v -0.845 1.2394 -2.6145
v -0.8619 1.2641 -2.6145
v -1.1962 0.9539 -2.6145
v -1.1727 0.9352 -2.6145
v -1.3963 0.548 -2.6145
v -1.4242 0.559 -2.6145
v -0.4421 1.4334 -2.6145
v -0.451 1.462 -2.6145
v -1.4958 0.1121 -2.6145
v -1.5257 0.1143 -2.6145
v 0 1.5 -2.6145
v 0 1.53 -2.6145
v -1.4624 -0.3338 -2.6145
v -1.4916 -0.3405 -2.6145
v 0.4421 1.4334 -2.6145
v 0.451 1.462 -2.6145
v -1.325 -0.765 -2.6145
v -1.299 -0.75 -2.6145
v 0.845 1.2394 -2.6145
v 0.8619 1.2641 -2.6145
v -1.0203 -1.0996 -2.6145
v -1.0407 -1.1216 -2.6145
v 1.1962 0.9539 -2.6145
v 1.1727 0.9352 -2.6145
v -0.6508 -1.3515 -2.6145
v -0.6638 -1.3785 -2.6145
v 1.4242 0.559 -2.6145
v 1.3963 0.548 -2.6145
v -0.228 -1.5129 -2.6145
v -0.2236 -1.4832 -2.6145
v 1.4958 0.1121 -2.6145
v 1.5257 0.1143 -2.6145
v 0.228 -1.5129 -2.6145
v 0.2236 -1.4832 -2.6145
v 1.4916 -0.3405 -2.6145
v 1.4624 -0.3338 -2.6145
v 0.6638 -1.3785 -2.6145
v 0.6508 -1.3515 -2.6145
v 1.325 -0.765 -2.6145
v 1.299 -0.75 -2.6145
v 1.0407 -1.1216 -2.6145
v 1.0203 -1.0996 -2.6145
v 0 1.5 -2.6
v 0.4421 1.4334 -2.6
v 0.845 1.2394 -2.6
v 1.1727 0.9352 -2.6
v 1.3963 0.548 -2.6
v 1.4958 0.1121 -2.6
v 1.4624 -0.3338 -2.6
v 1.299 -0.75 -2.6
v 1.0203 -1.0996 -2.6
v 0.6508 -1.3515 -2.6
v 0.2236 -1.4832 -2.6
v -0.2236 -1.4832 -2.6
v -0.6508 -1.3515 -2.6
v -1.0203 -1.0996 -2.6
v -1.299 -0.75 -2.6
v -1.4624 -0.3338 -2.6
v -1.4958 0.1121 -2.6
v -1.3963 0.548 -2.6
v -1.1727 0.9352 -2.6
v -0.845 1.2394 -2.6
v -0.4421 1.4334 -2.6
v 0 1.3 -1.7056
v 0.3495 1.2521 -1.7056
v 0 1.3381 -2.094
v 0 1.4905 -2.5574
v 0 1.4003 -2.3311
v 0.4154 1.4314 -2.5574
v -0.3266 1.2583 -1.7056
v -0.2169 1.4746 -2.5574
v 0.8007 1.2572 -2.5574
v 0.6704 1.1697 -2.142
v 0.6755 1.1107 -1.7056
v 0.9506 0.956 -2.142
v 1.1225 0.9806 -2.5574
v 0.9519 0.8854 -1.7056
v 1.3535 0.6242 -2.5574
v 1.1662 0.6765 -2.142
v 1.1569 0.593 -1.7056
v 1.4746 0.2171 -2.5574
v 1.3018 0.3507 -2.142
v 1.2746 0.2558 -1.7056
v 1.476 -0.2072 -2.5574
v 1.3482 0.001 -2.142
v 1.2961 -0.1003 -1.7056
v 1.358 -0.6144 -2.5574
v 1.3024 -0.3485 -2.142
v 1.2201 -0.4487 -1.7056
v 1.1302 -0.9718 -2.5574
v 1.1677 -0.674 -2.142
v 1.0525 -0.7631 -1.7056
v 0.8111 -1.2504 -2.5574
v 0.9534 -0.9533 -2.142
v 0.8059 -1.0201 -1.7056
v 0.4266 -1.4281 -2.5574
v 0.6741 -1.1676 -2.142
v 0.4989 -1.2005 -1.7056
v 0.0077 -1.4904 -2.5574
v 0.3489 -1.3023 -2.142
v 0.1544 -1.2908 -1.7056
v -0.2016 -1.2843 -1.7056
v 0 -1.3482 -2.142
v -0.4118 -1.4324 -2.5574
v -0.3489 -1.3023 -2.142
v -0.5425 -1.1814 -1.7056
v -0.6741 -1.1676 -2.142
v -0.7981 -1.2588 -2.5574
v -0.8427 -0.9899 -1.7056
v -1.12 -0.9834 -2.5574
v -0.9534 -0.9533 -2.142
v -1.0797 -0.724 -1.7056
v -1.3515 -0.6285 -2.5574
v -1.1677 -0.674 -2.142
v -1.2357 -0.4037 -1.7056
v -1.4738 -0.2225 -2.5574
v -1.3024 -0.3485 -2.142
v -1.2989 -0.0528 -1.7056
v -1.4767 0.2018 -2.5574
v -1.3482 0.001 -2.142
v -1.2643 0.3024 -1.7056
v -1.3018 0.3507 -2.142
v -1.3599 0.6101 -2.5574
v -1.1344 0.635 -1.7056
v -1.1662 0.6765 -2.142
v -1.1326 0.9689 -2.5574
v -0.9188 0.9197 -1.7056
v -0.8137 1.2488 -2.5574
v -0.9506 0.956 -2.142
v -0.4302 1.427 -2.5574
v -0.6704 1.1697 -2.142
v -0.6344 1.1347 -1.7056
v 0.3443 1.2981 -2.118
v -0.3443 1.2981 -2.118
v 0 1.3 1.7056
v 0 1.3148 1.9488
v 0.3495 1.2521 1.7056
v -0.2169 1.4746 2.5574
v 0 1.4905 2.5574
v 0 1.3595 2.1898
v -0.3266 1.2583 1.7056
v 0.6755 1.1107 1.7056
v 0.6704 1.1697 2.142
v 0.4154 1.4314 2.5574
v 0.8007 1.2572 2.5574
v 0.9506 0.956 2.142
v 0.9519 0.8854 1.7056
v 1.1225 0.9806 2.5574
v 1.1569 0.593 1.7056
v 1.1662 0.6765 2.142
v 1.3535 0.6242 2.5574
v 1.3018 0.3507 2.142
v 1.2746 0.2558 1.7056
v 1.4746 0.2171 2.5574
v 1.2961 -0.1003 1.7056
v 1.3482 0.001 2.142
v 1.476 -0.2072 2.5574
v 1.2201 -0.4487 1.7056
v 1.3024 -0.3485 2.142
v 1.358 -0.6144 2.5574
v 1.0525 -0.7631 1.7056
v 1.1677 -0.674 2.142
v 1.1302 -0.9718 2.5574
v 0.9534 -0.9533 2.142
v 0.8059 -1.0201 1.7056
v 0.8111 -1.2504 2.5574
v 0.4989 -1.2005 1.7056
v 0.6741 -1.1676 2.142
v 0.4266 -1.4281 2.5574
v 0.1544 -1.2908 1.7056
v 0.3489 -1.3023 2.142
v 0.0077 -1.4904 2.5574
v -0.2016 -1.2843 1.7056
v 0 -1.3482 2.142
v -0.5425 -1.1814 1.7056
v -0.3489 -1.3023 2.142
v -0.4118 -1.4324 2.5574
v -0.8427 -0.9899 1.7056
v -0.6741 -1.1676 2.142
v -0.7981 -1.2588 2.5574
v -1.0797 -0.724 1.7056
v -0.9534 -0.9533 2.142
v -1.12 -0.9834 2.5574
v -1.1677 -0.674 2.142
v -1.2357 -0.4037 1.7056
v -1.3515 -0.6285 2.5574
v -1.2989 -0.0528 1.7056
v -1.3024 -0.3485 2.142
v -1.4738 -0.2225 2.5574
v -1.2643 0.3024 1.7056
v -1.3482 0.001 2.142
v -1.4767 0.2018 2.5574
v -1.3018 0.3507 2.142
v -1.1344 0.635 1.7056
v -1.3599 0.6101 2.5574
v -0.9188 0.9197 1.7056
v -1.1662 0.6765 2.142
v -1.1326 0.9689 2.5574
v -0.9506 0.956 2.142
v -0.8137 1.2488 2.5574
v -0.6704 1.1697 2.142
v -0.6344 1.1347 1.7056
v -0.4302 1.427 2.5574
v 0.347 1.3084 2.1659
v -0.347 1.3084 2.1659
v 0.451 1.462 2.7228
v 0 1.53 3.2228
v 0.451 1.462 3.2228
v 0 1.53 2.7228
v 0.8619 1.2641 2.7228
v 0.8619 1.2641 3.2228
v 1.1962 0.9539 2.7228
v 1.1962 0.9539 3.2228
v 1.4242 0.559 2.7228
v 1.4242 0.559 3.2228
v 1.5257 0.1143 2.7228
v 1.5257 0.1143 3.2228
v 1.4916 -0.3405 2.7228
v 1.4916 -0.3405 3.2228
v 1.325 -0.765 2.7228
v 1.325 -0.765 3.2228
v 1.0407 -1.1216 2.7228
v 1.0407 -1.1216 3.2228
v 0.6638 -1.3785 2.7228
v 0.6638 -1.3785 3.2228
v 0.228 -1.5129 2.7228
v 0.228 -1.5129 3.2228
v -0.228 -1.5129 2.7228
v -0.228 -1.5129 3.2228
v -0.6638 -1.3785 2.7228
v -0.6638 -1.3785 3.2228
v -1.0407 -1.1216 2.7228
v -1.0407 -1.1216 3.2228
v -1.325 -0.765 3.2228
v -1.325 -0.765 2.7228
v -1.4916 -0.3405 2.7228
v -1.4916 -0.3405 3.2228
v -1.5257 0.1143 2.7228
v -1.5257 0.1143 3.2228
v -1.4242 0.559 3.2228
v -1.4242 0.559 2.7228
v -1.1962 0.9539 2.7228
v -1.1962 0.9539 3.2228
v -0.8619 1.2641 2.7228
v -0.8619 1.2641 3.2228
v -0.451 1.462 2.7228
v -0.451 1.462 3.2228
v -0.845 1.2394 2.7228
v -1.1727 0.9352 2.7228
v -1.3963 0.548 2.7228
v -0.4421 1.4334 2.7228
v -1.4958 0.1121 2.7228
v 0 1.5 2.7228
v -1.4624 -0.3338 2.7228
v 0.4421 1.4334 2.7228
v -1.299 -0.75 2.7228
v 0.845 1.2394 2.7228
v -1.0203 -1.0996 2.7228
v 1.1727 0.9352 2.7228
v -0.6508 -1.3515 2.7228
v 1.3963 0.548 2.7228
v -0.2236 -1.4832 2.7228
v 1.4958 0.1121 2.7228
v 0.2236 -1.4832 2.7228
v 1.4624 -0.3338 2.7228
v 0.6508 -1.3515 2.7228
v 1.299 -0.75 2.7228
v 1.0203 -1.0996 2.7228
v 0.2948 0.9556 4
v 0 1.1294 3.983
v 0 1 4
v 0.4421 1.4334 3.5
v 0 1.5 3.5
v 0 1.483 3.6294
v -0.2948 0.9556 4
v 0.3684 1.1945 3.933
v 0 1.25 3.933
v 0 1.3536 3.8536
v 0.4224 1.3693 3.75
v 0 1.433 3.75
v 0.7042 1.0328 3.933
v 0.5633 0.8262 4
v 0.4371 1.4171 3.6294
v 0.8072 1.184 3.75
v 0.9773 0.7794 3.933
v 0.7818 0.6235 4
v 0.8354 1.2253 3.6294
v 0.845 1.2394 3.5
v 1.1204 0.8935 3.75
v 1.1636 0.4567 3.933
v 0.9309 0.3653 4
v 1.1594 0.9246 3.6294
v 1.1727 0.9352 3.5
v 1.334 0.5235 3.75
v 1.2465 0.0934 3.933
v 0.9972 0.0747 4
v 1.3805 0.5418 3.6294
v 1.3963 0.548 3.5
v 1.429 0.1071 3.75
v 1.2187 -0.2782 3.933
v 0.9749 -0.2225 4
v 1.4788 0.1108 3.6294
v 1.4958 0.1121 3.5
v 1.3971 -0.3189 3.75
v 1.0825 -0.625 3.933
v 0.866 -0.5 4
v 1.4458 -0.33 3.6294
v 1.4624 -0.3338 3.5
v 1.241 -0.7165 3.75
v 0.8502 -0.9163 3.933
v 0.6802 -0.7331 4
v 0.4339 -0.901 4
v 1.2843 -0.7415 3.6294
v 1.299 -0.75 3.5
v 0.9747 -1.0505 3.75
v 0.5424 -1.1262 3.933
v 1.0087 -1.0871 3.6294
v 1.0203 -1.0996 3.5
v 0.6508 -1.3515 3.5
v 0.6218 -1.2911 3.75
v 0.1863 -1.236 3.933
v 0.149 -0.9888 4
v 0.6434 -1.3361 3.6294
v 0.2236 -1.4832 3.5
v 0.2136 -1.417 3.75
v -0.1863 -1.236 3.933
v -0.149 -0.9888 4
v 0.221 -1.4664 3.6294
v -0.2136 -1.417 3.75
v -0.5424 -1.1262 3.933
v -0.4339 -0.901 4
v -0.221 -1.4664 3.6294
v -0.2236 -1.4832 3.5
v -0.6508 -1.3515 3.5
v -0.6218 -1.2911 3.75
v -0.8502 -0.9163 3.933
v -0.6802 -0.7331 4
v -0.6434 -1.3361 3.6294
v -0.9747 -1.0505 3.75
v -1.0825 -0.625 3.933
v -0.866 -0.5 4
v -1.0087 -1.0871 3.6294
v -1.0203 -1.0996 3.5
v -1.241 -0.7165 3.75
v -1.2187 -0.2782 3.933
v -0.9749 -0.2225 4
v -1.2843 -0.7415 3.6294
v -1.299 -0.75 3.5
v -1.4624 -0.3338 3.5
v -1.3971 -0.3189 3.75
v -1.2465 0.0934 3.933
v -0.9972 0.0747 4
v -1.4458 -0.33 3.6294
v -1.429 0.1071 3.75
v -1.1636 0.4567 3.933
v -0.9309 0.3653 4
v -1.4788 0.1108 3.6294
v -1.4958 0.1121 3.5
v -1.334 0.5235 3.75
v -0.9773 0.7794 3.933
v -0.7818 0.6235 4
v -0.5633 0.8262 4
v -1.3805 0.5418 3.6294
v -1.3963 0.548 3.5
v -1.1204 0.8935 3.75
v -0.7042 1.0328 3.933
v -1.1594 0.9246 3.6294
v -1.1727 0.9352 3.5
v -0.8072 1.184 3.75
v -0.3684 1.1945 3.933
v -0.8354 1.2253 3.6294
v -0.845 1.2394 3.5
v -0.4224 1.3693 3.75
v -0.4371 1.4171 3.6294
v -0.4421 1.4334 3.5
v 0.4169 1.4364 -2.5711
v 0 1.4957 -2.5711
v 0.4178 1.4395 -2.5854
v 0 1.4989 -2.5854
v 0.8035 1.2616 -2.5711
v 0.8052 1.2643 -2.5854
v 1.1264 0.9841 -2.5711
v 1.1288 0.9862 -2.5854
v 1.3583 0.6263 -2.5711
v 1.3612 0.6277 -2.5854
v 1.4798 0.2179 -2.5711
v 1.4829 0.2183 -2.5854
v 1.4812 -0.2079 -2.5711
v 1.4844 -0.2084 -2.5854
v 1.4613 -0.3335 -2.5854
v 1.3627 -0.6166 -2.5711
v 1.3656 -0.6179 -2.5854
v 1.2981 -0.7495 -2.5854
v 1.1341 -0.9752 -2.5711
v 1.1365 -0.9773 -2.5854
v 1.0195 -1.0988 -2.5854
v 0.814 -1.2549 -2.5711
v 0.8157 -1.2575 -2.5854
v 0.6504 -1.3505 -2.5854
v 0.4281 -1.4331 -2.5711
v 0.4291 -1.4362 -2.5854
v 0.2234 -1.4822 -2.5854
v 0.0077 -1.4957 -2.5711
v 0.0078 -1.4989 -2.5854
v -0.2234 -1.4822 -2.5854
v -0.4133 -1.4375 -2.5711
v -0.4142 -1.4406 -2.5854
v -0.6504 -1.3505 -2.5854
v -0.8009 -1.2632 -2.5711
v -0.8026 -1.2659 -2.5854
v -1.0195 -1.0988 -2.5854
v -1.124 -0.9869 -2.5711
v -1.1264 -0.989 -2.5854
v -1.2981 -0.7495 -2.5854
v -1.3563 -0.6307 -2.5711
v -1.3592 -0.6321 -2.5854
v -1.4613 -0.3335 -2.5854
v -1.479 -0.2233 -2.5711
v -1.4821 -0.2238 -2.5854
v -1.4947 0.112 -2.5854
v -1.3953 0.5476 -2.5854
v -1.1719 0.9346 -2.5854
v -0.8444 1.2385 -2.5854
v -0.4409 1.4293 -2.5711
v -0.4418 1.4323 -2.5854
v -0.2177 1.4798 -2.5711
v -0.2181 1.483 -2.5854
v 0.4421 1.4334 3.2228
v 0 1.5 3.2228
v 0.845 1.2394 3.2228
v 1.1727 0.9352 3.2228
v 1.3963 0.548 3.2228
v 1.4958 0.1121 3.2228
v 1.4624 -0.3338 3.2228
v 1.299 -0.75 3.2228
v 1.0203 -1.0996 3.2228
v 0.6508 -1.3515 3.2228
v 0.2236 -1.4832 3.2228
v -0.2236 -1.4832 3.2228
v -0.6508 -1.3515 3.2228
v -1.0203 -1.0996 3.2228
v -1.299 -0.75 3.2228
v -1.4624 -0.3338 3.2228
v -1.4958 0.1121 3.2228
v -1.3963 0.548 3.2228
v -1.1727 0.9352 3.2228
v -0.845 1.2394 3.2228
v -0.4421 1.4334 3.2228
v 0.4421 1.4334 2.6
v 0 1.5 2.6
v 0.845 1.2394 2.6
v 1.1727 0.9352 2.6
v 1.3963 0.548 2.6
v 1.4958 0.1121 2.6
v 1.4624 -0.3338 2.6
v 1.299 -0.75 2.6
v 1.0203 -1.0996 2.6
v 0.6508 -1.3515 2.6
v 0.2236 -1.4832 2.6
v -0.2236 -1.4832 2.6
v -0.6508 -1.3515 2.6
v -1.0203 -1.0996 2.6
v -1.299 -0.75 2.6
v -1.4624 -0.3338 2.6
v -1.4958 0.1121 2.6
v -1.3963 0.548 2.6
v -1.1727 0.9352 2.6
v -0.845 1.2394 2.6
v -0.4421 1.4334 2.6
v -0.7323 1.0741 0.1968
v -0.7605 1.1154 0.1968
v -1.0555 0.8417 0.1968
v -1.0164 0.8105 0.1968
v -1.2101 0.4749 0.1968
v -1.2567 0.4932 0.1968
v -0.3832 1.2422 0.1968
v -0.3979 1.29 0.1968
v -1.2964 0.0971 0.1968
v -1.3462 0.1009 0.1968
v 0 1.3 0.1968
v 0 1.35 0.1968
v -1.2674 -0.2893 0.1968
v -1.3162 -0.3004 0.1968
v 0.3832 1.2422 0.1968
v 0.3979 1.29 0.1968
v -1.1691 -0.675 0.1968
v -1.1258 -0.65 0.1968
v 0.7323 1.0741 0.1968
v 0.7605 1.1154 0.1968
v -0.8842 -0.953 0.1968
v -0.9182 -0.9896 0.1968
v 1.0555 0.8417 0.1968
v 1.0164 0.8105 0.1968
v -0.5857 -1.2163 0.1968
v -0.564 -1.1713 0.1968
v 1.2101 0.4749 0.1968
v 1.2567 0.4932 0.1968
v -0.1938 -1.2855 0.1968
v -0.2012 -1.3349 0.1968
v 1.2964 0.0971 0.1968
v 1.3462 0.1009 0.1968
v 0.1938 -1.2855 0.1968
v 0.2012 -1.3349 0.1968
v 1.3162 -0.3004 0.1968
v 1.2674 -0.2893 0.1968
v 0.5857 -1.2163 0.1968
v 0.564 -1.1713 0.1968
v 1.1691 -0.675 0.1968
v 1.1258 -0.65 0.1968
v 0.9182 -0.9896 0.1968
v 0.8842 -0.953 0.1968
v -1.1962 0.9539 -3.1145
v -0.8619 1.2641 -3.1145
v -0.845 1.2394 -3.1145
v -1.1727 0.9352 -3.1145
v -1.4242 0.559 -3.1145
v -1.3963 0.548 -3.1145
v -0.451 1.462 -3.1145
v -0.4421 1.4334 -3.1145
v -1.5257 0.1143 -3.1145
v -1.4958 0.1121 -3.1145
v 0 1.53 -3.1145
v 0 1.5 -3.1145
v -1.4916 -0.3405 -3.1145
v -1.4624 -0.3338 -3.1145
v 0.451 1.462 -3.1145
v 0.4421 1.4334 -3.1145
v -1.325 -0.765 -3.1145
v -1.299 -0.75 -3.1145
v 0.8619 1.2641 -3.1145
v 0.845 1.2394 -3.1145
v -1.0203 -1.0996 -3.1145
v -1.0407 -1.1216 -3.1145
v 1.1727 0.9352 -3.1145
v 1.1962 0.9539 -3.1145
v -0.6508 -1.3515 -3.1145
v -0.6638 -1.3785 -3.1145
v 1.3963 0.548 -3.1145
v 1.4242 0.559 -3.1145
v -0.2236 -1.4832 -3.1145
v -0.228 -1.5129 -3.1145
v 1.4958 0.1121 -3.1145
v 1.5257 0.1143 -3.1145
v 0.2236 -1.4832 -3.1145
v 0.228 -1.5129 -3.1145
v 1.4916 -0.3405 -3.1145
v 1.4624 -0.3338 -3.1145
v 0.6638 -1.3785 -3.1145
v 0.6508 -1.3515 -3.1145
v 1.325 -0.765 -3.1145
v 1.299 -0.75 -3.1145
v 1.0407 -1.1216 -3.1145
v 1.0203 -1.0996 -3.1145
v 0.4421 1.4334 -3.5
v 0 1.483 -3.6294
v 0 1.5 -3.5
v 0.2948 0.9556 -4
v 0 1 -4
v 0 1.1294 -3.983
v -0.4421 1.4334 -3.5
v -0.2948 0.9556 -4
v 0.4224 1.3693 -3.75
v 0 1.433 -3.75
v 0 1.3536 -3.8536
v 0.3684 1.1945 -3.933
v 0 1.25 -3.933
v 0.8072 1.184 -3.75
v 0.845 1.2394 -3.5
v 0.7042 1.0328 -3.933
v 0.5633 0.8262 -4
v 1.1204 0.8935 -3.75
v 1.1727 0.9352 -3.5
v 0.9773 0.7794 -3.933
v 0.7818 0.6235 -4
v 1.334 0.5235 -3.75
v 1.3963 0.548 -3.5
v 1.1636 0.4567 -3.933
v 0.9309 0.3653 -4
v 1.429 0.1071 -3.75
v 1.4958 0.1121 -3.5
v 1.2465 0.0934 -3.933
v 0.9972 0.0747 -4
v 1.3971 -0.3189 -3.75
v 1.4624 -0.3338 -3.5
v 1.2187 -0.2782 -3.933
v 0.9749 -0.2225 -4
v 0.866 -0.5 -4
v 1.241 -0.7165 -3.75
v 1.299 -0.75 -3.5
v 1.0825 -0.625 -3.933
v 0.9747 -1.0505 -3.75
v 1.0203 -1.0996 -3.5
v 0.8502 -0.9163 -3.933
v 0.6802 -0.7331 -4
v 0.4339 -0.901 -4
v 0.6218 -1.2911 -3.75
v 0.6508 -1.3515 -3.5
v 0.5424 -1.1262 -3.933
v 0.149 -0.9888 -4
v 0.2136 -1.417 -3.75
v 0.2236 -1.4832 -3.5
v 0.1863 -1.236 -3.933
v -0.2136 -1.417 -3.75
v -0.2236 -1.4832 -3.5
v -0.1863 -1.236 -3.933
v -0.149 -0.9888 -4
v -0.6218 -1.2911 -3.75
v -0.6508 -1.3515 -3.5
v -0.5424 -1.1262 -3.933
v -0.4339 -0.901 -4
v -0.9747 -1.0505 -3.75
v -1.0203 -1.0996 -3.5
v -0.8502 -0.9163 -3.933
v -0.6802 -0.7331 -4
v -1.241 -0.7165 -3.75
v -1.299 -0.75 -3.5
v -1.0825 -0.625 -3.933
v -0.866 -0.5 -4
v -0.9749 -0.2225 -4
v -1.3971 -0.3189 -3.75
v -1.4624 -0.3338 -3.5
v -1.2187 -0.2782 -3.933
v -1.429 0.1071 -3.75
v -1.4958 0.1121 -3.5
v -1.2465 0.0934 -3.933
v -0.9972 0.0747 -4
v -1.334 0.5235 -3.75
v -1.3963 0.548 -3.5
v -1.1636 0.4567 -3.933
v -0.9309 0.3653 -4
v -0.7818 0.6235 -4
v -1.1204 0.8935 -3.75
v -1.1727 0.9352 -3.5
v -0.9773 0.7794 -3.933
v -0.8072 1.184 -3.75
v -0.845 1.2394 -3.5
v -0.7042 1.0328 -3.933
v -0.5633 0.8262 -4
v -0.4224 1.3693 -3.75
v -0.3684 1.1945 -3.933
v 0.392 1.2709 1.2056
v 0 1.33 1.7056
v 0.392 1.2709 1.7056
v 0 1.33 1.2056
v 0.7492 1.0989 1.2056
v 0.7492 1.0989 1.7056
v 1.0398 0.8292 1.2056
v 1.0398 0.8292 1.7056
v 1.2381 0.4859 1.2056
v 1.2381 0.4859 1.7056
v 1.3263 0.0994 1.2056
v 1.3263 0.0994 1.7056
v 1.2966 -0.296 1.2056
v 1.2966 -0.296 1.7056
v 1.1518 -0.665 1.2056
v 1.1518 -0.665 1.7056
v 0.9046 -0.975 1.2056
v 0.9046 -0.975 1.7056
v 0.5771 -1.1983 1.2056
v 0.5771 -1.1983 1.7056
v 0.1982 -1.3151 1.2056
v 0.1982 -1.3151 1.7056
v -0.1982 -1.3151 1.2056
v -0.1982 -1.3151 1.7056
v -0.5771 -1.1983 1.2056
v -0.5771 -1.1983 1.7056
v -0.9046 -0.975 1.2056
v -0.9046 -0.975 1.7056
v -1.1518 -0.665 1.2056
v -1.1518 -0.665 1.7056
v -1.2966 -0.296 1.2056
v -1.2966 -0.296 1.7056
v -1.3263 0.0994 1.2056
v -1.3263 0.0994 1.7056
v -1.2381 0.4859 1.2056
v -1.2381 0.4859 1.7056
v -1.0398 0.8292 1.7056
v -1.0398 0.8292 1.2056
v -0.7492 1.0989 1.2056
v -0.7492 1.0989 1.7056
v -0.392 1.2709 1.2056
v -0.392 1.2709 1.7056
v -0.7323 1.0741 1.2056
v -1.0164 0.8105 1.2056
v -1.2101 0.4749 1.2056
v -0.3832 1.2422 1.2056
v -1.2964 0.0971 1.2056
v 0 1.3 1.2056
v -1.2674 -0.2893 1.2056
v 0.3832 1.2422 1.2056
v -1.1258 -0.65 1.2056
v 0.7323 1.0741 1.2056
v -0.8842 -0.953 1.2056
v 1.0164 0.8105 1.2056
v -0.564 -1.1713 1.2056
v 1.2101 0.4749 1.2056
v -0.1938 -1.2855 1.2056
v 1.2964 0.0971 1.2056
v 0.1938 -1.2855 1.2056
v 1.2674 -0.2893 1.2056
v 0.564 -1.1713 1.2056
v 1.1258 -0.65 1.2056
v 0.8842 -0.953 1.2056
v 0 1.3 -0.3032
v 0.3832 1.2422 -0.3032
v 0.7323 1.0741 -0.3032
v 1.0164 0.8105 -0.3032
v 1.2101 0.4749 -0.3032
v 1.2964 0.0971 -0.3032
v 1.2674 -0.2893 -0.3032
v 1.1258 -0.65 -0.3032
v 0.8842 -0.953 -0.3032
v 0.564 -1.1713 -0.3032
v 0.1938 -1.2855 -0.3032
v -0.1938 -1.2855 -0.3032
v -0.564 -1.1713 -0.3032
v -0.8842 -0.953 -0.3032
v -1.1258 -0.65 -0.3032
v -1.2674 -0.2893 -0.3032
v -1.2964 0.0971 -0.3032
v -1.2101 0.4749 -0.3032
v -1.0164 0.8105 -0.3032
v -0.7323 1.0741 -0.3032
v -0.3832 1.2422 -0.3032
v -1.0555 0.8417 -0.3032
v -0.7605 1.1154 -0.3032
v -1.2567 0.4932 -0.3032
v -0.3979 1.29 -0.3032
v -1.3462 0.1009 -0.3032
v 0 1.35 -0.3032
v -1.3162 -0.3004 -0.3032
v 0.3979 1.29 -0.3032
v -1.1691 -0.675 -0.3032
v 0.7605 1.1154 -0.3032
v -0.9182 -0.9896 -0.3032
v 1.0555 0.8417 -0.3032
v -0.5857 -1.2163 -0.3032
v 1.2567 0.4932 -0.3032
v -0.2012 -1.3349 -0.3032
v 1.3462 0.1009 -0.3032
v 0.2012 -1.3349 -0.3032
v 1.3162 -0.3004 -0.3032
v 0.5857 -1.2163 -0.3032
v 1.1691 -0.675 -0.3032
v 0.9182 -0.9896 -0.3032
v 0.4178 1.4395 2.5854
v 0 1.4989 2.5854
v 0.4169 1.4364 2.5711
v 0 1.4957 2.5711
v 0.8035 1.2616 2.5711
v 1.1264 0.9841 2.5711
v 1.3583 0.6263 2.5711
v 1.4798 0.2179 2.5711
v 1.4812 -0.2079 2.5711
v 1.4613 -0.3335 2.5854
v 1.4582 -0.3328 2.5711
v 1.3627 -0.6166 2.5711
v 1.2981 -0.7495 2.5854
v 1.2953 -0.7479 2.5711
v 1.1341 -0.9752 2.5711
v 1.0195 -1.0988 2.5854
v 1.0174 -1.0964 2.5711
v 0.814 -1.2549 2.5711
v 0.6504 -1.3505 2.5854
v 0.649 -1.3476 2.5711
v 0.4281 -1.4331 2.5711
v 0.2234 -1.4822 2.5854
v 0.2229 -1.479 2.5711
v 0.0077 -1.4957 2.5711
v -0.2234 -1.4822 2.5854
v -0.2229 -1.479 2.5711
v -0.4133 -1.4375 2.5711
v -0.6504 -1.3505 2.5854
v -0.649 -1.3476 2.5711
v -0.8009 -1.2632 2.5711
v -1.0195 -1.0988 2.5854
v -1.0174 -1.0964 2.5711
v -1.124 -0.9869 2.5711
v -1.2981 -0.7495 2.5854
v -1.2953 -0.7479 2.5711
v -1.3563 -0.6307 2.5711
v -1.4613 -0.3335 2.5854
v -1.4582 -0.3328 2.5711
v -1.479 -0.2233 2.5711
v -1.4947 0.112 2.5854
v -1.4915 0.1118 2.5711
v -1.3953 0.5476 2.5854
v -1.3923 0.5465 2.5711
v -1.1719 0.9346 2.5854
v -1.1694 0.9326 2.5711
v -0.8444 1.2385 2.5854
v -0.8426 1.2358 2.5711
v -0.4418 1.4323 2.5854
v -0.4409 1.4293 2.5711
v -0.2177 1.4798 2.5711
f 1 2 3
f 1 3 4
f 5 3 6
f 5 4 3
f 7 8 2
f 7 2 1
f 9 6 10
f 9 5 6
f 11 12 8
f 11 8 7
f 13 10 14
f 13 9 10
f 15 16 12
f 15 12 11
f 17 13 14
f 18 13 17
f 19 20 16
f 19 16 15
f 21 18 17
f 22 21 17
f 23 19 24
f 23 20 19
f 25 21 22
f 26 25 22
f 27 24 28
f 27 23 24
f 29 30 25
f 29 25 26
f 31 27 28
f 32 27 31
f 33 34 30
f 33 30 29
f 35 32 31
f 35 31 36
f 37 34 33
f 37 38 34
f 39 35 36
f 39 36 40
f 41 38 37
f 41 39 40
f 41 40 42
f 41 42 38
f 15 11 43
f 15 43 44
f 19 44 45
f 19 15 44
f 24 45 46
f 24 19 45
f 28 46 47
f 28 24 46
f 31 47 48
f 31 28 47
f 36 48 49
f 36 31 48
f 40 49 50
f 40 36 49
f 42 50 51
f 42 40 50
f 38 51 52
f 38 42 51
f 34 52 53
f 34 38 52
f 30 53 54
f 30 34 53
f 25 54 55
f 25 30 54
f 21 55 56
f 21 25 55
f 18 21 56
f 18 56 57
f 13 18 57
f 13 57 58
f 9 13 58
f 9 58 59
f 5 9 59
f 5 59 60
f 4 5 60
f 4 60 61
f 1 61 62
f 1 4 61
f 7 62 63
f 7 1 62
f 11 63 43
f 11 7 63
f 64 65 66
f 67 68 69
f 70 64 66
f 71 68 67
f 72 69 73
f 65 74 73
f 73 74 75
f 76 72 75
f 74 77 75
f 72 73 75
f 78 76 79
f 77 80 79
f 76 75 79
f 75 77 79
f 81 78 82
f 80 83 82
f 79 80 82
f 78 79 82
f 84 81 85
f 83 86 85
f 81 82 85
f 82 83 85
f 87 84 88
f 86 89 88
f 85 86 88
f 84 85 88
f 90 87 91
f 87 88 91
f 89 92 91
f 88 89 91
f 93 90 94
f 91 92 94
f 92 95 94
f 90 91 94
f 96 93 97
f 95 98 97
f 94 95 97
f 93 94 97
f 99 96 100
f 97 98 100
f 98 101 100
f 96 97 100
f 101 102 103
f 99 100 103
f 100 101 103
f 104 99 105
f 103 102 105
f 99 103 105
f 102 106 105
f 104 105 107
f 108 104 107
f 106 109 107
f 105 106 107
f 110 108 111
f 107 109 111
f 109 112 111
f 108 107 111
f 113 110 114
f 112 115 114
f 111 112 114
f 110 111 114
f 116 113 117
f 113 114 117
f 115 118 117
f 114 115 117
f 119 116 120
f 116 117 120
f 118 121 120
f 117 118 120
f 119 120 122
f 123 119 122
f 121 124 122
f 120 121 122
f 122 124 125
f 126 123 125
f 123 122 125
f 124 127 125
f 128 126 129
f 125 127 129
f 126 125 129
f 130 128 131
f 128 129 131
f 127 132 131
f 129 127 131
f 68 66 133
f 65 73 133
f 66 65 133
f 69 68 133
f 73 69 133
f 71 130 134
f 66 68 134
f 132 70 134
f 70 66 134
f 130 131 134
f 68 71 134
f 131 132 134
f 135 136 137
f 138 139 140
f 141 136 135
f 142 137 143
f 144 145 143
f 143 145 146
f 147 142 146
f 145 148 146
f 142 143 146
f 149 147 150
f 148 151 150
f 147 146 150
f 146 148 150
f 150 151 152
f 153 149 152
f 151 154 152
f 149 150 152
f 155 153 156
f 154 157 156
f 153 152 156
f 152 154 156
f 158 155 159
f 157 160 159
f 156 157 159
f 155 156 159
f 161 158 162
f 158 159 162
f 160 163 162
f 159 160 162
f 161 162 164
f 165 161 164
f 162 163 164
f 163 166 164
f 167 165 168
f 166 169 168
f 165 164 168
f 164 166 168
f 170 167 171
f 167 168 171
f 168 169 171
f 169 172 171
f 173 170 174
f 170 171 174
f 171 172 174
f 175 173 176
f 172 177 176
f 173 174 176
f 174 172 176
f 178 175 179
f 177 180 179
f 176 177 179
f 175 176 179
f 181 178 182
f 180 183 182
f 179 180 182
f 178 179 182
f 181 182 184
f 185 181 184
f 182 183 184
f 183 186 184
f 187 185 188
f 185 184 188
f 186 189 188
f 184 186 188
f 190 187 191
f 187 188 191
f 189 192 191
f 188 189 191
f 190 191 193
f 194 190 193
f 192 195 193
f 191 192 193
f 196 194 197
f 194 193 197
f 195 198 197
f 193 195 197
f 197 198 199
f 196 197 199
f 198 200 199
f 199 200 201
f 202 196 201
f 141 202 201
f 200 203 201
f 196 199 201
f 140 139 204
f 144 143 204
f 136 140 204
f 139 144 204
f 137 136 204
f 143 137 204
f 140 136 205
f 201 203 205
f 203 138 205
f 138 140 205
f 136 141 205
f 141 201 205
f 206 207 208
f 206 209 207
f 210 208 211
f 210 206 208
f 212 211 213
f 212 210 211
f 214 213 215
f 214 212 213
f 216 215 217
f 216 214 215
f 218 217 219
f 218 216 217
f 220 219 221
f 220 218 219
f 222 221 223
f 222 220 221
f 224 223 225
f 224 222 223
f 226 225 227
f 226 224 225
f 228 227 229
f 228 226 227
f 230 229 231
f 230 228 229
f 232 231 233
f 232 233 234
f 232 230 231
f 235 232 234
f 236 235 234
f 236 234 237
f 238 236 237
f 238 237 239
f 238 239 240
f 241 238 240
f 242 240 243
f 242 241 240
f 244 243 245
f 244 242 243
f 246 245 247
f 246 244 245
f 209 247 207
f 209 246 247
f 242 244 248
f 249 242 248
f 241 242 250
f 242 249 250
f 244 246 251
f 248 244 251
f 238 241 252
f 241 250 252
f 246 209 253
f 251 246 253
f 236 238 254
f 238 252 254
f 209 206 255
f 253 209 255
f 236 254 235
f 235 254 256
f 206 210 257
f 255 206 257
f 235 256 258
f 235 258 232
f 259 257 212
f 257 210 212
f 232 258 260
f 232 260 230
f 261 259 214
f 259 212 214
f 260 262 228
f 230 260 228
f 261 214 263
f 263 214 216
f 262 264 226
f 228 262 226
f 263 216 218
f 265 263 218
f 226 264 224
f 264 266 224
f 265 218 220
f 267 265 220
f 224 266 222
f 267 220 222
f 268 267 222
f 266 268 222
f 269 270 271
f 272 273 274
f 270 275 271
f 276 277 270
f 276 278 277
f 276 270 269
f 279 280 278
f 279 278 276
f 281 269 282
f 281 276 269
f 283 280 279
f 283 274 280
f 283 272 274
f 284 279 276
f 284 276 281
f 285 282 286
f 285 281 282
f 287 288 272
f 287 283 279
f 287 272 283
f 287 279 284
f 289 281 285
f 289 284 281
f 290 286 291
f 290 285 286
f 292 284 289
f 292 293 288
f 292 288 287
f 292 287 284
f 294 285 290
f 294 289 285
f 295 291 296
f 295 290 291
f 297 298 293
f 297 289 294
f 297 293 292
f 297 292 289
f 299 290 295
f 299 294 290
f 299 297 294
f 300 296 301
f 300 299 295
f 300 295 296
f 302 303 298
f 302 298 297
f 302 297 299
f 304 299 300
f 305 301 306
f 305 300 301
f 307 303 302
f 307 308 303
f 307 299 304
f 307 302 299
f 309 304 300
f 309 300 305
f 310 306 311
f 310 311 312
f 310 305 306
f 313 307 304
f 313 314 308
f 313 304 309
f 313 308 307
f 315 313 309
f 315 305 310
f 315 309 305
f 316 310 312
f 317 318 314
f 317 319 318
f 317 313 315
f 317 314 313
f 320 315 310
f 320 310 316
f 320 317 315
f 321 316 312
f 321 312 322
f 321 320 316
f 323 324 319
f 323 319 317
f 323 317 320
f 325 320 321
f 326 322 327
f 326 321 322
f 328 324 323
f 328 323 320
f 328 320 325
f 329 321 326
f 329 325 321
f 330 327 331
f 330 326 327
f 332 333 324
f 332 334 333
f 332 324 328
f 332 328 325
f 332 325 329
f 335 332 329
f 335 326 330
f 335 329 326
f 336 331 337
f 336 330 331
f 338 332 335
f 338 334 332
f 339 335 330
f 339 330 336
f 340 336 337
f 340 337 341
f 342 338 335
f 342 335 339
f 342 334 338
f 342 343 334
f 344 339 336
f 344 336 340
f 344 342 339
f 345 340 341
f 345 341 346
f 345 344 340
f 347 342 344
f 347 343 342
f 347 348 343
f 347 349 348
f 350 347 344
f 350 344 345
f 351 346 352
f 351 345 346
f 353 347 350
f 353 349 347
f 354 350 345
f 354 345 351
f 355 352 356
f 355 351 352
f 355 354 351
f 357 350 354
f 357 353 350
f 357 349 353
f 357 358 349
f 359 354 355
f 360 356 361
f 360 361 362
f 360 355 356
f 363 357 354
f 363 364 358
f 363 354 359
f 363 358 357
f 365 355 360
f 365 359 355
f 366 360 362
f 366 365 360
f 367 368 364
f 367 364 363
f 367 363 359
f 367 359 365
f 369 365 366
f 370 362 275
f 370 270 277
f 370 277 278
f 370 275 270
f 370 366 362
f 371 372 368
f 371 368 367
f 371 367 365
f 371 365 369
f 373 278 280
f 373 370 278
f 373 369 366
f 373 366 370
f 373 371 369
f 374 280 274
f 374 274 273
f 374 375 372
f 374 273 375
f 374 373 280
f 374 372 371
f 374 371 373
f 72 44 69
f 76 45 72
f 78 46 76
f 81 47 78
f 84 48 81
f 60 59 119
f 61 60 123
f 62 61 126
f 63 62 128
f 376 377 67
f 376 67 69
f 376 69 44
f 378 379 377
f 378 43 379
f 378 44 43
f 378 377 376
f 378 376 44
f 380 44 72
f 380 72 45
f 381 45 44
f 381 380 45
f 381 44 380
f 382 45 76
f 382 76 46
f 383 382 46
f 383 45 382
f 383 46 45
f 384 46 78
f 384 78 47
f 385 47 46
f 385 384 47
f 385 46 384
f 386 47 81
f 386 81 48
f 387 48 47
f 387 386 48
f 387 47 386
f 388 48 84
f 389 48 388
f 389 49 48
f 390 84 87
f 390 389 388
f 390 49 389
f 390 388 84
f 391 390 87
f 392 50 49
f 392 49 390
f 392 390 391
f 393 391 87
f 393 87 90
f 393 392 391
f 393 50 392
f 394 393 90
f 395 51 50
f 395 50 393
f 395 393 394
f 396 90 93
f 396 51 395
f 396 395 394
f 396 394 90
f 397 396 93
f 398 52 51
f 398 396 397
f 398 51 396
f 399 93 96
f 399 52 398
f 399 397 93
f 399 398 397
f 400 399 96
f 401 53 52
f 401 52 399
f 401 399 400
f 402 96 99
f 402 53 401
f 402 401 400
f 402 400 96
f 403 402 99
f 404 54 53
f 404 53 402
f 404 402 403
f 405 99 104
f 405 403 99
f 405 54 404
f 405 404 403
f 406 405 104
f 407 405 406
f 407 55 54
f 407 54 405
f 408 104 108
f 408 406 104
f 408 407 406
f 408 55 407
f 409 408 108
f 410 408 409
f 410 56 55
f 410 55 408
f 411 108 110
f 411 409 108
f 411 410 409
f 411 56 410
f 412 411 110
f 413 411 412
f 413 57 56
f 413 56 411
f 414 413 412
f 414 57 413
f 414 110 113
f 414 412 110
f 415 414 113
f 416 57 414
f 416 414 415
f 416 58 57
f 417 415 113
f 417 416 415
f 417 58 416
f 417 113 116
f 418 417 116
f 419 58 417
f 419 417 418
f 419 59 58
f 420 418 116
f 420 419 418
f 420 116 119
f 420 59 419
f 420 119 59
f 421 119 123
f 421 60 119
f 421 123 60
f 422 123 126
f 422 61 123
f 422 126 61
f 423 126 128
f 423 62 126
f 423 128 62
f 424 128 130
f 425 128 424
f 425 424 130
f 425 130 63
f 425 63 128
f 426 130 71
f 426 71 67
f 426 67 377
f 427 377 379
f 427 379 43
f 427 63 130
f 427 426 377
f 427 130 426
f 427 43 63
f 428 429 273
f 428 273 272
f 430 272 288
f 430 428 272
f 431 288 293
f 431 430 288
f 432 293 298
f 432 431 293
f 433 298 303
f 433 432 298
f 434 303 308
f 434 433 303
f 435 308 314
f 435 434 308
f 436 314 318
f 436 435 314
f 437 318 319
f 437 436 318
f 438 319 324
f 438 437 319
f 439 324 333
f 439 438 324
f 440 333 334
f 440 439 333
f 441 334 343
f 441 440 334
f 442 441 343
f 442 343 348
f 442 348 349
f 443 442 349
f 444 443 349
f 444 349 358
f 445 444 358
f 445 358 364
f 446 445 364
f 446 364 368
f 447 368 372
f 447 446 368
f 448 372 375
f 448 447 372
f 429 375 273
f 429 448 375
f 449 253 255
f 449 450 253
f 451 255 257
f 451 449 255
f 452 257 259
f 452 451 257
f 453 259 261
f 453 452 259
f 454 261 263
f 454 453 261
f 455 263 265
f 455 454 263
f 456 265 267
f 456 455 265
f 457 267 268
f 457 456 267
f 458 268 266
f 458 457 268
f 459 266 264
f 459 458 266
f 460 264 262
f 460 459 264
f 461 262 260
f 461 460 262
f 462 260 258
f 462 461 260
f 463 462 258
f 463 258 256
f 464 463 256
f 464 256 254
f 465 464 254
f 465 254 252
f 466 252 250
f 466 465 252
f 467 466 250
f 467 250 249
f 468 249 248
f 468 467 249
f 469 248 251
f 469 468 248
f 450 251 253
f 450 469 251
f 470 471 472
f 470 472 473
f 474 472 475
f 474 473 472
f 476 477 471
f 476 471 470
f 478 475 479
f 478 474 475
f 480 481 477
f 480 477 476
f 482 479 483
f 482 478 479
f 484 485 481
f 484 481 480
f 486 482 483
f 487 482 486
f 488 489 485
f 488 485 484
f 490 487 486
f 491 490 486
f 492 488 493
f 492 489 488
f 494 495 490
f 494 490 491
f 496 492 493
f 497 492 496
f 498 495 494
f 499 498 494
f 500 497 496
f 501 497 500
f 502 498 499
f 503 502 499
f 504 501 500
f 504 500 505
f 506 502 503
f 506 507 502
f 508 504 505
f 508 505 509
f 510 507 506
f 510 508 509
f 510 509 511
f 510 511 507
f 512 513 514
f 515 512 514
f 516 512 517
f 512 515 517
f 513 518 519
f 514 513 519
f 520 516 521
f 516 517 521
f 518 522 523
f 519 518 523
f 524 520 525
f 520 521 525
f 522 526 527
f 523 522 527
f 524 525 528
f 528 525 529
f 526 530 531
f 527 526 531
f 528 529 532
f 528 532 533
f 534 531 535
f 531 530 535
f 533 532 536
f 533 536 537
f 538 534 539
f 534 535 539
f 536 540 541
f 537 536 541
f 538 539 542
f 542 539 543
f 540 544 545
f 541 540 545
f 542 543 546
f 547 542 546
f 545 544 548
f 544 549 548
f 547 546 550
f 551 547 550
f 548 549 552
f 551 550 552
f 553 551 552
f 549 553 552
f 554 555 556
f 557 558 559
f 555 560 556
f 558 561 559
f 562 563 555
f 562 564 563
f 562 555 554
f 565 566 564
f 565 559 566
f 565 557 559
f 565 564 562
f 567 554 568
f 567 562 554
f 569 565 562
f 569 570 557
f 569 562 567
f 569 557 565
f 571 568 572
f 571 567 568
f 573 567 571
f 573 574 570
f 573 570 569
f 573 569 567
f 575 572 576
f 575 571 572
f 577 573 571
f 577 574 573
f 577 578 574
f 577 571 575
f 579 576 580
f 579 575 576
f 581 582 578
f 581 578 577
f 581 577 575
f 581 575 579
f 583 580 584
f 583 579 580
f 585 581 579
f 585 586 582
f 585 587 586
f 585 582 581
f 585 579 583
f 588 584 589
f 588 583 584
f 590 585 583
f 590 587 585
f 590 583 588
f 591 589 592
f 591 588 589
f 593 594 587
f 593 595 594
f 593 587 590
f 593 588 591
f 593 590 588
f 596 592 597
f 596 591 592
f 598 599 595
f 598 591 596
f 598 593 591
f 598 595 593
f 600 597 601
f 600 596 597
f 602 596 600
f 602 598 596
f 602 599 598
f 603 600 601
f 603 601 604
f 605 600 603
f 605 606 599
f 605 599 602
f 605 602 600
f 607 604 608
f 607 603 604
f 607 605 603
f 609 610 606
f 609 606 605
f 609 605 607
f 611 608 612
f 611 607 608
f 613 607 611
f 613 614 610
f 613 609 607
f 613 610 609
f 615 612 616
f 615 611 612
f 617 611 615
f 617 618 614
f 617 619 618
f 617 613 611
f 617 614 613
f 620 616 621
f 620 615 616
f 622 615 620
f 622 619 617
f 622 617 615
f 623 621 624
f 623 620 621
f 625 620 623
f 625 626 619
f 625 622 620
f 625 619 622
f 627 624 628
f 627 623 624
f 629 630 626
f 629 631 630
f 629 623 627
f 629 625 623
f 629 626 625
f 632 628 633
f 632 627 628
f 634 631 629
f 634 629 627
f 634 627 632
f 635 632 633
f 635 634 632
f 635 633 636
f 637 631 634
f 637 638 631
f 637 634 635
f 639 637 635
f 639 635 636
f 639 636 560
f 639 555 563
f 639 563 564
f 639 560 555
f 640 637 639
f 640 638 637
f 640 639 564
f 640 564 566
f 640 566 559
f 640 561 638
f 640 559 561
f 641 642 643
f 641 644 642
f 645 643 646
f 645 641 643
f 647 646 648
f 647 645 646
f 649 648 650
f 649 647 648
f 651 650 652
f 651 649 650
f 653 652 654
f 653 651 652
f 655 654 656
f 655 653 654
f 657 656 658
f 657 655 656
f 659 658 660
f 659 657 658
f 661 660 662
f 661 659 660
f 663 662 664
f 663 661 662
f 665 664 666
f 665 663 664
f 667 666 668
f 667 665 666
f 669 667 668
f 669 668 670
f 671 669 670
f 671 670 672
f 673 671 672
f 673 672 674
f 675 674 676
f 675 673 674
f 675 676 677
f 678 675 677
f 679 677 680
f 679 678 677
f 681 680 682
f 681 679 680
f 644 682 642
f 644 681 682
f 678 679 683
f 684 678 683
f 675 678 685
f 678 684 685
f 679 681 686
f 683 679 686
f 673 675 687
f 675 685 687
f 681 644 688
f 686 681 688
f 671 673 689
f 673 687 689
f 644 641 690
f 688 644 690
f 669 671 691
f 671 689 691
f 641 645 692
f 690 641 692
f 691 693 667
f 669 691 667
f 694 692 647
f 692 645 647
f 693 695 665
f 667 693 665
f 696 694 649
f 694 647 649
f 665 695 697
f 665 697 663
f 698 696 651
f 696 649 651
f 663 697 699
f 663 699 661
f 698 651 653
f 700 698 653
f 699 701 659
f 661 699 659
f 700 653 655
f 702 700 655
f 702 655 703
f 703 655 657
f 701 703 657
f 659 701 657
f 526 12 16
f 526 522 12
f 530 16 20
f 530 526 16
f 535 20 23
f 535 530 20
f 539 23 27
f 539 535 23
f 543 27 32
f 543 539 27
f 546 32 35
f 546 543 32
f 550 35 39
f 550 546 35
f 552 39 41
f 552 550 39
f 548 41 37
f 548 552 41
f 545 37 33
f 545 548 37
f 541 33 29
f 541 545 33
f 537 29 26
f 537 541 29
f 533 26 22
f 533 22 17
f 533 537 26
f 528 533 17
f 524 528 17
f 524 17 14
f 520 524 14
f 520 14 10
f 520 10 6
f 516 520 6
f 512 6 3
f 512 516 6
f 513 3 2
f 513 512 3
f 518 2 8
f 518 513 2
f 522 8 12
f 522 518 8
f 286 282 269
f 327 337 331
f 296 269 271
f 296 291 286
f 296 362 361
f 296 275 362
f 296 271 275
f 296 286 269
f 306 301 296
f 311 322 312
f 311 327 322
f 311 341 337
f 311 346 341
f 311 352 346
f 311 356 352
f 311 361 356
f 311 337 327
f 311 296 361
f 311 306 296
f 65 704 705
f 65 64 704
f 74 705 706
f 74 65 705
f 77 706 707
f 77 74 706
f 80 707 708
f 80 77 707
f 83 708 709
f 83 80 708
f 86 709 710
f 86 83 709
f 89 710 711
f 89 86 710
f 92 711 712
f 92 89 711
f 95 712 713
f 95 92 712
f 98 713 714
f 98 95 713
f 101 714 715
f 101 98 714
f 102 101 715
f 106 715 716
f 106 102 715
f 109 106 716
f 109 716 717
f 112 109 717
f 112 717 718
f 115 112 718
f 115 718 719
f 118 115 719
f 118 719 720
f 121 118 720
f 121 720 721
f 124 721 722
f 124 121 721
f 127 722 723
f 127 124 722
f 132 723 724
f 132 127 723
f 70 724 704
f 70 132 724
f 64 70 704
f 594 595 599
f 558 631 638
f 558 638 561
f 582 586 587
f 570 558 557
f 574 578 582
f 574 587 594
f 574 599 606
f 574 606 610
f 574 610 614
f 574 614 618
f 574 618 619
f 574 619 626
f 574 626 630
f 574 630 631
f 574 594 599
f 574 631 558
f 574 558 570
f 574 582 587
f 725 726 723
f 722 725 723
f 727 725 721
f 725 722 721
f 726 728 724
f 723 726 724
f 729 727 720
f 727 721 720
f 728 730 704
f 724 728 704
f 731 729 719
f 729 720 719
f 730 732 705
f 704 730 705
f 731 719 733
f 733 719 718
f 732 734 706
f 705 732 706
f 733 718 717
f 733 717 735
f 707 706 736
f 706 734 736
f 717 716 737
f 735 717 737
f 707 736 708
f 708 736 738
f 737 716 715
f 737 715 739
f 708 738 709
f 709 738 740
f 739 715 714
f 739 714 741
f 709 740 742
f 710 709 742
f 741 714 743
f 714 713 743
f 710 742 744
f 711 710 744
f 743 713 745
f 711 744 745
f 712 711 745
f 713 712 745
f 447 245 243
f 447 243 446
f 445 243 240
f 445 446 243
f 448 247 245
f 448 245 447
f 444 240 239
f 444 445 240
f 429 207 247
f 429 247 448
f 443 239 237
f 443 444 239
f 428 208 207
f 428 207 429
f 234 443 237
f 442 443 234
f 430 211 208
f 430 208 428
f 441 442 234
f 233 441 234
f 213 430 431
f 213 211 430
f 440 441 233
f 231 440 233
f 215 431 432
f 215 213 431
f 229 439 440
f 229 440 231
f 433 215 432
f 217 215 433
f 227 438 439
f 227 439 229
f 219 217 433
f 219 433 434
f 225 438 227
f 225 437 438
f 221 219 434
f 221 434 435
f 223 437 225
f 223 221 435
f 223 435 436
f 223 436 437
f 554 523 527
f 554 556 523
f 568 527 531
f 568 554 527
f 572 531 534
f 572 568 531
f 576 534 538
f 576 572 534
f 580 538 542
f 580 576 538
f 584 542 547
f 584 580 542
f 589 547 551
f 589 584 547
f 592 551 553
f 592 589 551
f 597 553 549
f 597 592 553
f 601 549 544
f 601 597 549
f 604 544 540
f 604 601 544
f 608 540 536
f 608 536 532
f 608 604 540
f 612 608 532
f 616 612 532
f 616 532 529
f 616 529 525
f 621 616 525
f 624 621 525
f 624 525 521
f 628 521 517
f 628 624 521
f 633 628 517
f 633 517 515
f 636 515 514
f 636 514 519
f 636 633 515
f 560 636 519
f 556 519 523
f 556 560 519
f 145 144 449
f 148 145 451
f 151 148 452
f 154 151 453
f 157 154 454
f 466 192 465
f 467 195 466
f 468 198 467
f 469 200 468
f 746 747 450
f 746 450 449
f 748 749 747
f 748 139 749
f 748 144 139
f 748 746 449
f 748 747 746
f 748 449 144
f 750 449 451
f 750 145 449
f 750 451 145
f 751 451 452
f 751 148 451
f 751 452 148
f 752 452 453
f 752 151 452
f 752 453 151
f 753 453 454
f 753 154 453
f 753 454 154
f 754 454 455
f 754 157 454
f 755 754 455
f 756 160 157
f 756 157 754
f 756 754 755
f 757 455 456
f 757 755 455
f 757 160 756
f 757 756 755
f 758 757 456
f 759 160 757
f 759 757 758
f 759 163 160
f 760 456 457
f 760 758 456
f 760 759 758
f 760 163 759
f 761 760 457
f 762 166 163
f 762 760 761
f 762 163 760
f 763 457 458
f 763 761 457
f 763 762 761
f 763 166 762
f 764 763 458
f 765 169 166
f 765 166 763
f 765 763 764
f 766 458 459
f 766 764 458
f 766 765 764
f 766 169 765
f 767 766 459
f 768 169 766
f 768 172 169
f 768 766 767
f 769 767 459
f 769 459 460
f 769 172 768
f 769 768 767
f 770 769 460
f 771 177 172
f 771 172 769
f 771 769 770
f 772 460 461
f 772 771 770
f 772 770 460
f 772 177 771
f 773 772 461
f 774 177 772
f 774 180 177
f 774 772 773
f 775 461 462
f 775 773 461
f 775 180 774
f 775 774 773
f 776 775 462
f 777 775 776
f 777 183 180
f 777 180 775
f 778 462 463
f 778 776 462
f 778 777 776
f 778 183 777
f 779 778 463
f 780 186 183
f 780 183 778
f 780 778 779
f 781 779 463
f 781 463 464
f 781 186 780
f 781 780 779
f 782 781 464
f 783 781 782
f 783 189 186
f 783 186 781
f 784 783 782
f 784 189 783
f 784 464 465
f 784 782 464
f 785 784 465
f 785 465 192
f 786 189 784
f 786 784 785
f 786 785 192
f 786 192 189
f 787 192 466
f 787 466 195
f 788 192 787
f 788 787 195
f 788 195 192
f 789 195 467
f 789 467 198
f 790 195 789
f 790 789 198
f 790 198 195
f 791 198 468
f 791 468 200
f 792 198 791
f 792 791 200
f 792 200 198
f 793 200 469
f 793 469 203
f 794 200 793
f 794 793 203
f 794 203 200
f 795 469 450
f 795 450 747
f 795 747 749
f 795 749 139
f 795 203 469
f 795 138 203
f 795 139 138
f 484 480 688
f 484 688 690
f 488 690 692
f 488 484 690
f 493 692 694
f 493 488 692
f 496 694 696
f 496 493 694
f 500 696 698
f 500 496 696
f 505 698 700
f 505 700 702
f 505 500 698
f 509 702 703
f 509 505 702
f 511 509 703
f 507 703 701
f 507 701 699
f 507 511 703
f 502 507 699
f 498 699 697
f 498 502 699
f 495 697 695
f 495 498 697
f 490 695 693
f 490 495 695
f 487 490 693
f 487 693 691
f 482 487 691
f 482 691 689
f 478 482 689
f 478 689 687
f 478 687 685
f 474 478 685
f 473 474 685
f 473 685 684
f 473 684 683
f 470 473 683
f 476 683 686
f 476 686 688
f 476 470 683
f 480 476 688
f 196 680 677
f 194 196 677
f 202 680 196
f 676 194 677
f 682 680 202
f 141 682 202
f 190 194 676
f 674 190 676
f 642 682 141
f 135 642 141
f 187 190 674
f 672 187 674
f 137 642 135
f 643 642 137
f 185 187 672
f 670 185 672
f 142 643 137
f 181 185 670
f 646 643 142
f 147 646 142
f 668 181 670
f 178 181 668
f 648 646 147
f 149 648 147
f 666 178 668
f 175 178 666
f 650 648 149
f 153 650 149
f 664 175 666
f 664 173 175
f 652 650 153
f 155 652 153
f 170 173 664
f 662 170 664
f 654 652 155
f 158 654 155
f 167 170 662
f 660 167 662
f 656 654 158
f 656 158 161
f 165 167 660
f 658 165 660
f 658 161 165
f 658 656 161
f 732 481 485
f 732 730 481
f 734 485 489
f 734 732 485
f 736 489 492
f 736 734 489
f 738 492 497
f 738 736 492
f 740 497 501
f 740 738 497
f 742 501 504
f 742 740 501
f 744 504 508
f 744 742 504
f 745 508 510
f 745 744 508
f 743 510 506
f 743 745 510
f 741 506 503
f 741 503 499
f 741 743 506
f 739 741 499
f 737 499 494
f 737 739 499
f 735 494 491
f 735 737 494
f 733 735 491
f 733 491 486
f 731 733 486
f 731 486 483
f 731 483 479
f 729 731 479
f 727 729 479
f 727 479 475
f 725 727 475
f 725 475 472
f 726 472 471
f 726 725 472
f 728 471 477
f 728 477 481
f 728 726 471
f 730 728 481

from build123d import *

# Parameters (mm, degrees)
FILLET1_R = 2
SKETCH2_W = 0.5
SKETCH2_H = 0.029991608
SKETCH3_W = 0.5
SKETCH3_H = 0.05
SKETCH4_W = 0.5
SKETCH4_H = 0.03
SKETCH5_W = 0.5
SKETCH5_H = 0.03


with BuildPart() as part:
    # Sketch1 → Revolve1 (revolve)
    with BuildSketch(Plane(origin=(0, 0, 0), x_dir=(0, 0, -1), z_dir=(1, 0, 0))):
        with BuildLine():
            Line((2.6, 1.5), (3.5, 1.5))
            ThreePointArc((3.5, 1.5), (3.853553391, 1.353553391), (4, 1))
            Line((4, 1), (4, 0))
            Line((4, 0), (-4, 0))
            Line((-4, 0), (-4, 1))
            ThreePointArc((-4, 1), (-3.853553391, 1.353553391), (-3.5, 1.5))
            Line((-3.5, 1.5), (-2.6, 1.5))
            ThreePointArc((-2.6, 1.5), (-2.529289322, 1.470710678), (-2.5, 1.4))
            Line((-2.5, 1.4), (-2.5, 1.3))
            Line((-2.5, 1.3), (2.5, 1.3))
            Line((2.5, 1.3), (2.5, 1.4))
            ThreePointArc((2.5, 1.4), (2.529289322, 1.470710678), (2.6, 1.5))
        make_face()
    revolve(axis=Axis((0, 0, 30.94688027), (0, 0, -1)))

    # Fillet1
    fillet1_edges = [part.edges().sort_by_distance(p)[0] for p in [
        (0, -1.3, -2.5),
        (0, -1.3, 2.5),
    ]]
    fillet(fillet1_edges, radius=FILLET1_R)

    # Sketch2 → Revolve2 (revolve)
    with BuildSketch(Plane(origin=(0, 0, 0), x_dir=(0, 0, -1), z_dir=(1, 0, 0))):
        with Locations((-1.455572809, 1.314995804)):
            Rectangle(SKETCH2_W, SKETCH2_H)
    revolve(axis=Axis((0, 0, 2.184724067), (0, 0, -1)))

    # Sketch3 → Revolve3 (revolve)
    with BuildSketch(Plane(origin=(0, 0, 0), x_dir=(0, 0, -1), z_dir=(1, 0, 0))):
        with Locations((0.053199548, 1.325)):
            Rectangle(SKETCH3_W, SKETCH3_H)
    revolve(axis=Axis((0, 0, 0.48939527), (0, 0, -1)))

    # Sketch4 → Revolve4 (revolve)
    with BuildSketch(Plane(origin=(0, 0, 0), x_dir=(0, 0, -1), z_dir=(1, 0, 0))):
        with Locations((-2.972757668, 1.515)):
            Rectangle(SKETCH4_W, SKETCH4_H)
    revolve(axis=Axis((0, 0, 0.449237838), (0, 0, -1)))

    # Sketch5 → Revolve5 (revolve)
    with BuildSketch(Plane(origin=(0, 0, 0), x_dir=(0, 0, -1), z_dir=(1, 0, 0))):
        with Locations((2.864549609, 1.515)):
            Rectangle(SKETCH5_W, SKETCH5_H)
    revolve(axis=Axis((0, 0, 0.313399994), (0, 0, -1)))


solid = part.part
